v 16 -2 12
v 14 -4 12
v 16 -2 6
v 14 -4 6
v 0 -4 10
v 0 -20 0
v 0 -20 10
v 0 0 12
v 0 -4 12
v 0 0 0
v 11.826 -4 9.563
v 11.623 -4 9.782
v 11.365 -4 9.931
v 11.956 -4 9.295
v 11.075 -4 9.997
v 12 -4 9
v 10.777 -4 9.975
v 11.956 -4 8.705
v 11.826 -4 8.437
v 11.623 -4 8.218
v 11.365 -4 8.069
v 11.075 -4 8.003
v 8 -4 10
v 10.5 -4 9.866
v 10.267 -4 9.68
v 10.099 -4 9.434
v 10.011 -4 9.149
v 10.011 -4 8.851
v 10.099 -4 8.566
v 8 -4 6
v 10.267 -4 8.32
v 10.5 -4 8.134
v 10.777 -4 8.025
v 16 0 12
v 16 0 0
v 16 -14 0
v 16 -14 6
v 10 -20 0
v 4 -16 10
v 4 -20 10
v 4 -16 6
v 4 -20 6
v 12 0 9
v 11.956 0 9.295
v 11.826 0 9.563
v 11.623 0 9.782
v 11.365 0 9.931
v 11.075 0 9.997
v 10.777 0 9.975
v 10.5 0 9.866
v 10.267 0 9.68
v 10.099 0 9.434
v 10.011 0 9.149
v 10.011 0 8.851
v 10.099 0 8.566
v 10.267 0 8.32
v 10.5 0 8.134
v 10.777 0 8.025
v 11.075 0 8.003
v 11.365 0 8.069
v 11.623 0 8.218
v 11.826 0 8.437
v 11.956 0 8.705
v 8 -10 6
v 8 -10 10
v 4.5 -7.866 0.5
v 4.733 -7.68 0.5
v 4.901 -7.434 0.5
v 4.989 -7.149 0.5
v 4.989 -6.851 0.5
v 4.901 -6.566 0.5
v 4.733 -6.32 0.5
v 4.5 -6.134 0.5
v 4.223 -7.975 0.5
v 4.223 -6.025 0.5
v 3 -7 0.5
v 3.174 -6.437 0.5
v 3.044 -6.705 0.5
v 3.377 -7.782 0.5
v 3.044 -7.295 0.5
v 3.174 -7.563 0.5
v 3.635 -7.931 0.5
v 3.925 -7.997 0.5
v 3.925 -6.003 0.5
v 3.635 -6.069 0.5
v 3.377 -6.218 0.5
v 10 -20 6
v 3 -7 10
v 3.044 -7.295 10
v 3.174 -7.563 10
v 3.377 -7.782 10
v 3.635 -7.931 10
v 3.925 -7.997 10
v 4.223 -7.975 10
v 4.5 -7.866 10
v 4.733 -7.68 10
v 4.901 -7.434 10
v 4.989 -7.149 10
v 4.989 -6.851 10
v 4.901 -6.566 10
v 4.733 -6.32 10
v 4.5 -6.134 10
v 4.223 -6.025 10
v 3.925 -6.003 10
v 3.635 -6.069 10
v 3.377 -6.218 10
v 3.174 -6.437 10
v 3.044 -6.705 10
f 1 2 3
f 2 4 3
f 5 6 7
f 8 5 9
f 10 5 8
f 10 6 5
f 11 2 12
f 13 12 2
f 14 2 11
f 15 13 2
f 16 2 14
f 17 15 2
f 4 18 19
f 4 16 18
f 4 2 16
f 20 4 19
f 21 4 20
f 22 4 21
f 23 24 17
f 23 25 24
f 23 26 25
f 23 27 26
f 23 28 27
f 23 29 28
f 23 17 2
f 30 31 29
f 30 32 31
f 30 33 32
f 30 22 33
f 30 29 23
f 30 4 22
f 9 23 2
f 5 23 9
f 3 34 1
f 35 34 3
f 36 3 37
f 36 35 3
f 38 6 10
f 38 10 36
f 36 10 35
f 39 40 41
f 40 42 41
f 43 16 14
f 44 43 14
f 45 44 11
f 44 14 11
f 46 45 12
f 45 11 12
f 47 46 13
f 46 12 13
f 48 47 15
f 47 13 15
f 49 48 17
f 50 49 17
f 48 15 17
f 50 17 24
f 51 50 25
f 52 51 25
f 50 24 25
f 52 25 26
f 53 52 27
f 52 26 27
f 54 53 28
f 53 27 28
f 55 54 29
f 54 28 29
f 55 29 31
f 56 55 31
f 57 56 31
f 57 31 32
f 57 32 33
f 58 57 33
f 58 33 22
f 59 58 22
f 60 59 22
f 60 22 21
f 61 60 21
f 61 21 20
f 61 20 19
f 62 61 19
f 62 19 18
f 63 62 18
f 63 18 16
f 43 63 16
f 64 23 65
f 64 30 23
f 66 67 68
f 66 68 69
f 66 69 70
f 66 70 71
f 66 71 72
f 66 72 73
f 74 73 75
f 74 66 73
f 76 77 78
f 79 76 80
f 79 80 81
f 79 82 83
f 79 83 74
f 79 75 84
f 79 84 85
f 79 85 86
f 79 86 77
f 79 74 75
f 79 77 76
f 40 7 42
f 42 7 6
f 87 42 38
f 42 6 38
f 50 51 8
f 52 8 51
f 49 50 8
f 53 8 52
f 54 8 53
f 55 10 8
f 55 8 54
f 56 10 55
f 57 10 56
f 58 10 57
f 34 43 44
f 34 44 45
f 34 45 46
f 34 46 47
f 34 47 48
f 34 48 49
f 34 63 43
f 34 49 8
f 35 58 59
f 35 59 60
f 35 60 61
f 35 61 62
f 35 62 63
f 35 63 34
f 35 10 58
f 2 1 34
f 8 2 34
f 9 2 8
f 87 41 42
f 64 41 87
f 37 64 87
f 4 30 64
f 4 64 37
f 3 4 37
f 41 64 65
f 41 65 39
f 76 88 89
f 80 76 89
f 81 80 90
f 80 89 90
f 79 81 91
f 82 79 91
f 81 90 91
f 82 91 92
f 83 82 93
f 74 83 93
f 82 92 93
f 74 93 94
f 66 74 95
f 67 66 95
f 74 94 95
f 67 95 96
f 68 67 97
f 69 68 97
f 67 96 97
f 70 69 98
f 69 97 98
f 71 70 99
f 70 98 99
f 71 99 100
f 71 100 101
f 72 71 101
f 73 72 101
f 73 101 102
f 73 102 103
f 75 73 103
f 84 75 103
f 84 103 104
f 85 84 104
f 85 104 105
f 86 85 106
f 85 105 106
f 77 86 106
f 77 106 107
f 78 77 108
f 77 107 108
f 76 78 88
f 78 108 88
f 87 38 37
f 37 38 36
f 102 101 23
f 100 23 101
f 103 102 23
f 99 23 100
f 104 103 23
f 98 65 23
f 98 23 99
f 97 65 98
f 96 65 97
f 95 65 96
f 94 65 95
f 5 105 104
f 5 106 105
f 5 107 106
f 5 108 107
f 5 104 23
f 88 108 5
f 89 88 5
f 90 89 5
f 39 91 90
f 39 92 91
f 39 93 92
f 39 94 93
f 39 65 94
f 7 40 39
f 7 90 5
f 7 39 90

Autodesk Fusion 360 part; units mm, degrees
sketch "Sketch1" plane through (0, 0, 0) normal (0, 0, 1) x (1, 0, 0)
  line L0 (0, 0) -> (16, 0)
  line L1 (16, 0) -> (16, -14)
  line L2 (0, -20) -> (10, -20)
  line L3 (0, -20) -> (0, 0)
  line L4 (10, -20) -> (16, -14)
  dimension "d1" = 16
  dimension "d2" = 14
  dimension "d3" = 10
  dimension "d4" = 20
extrude "Extrude1" add sketch "Sketch1" along normal blind 6
sketch "Sketch2" plane through (0, 0, 6) normal (0, 0, 1) x (-1, 0, 0)
  line L0 (0, 20) -> (-10, 20)
  line L1 (-10, 20) -> (-16, 14)
  line L2 (-16, 14) -> (-16, 0)
  line L3 (-16, 0) -> (0, 0)
  line L4 (0, 0) -> (0, 20)
  line L5 (0, 0) -> (-14, 0)
  line L6 (-14, 0) -> (-14, 4)
  line L7 (-14, 4) -> (0, 4)
  line L8 (0, 4) -> (0, 0)
  line L9 (-14, 4) -> (-16, 2)
  line L10 (-14, 4) -> (-11.1716, 4) construction
  line L11 (0, 20) -> (-4, 20)
  line L12 (-4, 20) -> (-4, 4)
  line L13 (-4, 4) -> (0, 4)
  line L14 (0, 4) -> (0, 20)
  line L15 (0, 4) -> (-8, 4)
  line L16 (-8, 4) -> (-8, 10)
  line L17 (-8, 10) -> (0, 10)
  line L18 (0, 10) -> (0, 4)
  line L19 (-8, 10) -> (-4, 16)
  dimension "d7" = 14
  dimension "d8" = 4
  dimension "d9" = 135
  dimension "d10" = 4
  dimension "d11" = 8
  dimension "d12" = 6
  dimension "d13" = 4
extrude "Extrude2" add sketch "Sketch2" along normal blind 4 contours L0 L4 L11 L12 L14 L17 | L4 L7 L12 L13 L14 L15 L17 L18 | L12 L17 L19 | L7 L12 L15 L16 L17
extrude "Extrude3" add sketch "Sketch2" along normal blind 6 contours L3 L4 L5 L6 L7 L8 L13 L15 | L2 L3 L6 L9
sketch "Sketch3" plane through (0, -4, 0) normal (0, -1, 0) x (1, 0, 0)
  line L0 (0, 10) -> (8, 10)
  line L1 (8, 10) -> (8, 6)
  line L2 (8, 6) -> (14, 6)
  line L3 (14, 6) -> (14, 12)
  line L4 (14, 12) -> (0, 12)
  line L5 (0, 12) -> (0, 10)
  circle A0 centre (11, 9) radius 1
  dimension "d18" = 2
  dimension "d19" = 3
  dimension "d20" = 3
extrude "Extrude4" cut sketch "Sketch3" against normal blind 9 contours A0
sketch "Sketch4" plane through (0, 0, 10) normal (0, 0, 1) x (-1, 0, 0)
  line L0 (0, 4) -> (0, 20)
  line L1 (0, 20) -> (-4, 20)
  line L2 (-4, 20) -> (-4, 16)
  line L3 (-4, 16) -> (-8, 10)
  line L4 (-8, 10) -> (-8, 4)
  line L5 (-8, 4) -> (0, 4)
  circle A0 centre (-4, 7) radius 1
  dimension "d23" = 2
  dimension "d24" = 4
  dimension "d25" = 3
extrude "Extrude5" cut sketch "Sketch4" against normal blind 9.5 contours A0
